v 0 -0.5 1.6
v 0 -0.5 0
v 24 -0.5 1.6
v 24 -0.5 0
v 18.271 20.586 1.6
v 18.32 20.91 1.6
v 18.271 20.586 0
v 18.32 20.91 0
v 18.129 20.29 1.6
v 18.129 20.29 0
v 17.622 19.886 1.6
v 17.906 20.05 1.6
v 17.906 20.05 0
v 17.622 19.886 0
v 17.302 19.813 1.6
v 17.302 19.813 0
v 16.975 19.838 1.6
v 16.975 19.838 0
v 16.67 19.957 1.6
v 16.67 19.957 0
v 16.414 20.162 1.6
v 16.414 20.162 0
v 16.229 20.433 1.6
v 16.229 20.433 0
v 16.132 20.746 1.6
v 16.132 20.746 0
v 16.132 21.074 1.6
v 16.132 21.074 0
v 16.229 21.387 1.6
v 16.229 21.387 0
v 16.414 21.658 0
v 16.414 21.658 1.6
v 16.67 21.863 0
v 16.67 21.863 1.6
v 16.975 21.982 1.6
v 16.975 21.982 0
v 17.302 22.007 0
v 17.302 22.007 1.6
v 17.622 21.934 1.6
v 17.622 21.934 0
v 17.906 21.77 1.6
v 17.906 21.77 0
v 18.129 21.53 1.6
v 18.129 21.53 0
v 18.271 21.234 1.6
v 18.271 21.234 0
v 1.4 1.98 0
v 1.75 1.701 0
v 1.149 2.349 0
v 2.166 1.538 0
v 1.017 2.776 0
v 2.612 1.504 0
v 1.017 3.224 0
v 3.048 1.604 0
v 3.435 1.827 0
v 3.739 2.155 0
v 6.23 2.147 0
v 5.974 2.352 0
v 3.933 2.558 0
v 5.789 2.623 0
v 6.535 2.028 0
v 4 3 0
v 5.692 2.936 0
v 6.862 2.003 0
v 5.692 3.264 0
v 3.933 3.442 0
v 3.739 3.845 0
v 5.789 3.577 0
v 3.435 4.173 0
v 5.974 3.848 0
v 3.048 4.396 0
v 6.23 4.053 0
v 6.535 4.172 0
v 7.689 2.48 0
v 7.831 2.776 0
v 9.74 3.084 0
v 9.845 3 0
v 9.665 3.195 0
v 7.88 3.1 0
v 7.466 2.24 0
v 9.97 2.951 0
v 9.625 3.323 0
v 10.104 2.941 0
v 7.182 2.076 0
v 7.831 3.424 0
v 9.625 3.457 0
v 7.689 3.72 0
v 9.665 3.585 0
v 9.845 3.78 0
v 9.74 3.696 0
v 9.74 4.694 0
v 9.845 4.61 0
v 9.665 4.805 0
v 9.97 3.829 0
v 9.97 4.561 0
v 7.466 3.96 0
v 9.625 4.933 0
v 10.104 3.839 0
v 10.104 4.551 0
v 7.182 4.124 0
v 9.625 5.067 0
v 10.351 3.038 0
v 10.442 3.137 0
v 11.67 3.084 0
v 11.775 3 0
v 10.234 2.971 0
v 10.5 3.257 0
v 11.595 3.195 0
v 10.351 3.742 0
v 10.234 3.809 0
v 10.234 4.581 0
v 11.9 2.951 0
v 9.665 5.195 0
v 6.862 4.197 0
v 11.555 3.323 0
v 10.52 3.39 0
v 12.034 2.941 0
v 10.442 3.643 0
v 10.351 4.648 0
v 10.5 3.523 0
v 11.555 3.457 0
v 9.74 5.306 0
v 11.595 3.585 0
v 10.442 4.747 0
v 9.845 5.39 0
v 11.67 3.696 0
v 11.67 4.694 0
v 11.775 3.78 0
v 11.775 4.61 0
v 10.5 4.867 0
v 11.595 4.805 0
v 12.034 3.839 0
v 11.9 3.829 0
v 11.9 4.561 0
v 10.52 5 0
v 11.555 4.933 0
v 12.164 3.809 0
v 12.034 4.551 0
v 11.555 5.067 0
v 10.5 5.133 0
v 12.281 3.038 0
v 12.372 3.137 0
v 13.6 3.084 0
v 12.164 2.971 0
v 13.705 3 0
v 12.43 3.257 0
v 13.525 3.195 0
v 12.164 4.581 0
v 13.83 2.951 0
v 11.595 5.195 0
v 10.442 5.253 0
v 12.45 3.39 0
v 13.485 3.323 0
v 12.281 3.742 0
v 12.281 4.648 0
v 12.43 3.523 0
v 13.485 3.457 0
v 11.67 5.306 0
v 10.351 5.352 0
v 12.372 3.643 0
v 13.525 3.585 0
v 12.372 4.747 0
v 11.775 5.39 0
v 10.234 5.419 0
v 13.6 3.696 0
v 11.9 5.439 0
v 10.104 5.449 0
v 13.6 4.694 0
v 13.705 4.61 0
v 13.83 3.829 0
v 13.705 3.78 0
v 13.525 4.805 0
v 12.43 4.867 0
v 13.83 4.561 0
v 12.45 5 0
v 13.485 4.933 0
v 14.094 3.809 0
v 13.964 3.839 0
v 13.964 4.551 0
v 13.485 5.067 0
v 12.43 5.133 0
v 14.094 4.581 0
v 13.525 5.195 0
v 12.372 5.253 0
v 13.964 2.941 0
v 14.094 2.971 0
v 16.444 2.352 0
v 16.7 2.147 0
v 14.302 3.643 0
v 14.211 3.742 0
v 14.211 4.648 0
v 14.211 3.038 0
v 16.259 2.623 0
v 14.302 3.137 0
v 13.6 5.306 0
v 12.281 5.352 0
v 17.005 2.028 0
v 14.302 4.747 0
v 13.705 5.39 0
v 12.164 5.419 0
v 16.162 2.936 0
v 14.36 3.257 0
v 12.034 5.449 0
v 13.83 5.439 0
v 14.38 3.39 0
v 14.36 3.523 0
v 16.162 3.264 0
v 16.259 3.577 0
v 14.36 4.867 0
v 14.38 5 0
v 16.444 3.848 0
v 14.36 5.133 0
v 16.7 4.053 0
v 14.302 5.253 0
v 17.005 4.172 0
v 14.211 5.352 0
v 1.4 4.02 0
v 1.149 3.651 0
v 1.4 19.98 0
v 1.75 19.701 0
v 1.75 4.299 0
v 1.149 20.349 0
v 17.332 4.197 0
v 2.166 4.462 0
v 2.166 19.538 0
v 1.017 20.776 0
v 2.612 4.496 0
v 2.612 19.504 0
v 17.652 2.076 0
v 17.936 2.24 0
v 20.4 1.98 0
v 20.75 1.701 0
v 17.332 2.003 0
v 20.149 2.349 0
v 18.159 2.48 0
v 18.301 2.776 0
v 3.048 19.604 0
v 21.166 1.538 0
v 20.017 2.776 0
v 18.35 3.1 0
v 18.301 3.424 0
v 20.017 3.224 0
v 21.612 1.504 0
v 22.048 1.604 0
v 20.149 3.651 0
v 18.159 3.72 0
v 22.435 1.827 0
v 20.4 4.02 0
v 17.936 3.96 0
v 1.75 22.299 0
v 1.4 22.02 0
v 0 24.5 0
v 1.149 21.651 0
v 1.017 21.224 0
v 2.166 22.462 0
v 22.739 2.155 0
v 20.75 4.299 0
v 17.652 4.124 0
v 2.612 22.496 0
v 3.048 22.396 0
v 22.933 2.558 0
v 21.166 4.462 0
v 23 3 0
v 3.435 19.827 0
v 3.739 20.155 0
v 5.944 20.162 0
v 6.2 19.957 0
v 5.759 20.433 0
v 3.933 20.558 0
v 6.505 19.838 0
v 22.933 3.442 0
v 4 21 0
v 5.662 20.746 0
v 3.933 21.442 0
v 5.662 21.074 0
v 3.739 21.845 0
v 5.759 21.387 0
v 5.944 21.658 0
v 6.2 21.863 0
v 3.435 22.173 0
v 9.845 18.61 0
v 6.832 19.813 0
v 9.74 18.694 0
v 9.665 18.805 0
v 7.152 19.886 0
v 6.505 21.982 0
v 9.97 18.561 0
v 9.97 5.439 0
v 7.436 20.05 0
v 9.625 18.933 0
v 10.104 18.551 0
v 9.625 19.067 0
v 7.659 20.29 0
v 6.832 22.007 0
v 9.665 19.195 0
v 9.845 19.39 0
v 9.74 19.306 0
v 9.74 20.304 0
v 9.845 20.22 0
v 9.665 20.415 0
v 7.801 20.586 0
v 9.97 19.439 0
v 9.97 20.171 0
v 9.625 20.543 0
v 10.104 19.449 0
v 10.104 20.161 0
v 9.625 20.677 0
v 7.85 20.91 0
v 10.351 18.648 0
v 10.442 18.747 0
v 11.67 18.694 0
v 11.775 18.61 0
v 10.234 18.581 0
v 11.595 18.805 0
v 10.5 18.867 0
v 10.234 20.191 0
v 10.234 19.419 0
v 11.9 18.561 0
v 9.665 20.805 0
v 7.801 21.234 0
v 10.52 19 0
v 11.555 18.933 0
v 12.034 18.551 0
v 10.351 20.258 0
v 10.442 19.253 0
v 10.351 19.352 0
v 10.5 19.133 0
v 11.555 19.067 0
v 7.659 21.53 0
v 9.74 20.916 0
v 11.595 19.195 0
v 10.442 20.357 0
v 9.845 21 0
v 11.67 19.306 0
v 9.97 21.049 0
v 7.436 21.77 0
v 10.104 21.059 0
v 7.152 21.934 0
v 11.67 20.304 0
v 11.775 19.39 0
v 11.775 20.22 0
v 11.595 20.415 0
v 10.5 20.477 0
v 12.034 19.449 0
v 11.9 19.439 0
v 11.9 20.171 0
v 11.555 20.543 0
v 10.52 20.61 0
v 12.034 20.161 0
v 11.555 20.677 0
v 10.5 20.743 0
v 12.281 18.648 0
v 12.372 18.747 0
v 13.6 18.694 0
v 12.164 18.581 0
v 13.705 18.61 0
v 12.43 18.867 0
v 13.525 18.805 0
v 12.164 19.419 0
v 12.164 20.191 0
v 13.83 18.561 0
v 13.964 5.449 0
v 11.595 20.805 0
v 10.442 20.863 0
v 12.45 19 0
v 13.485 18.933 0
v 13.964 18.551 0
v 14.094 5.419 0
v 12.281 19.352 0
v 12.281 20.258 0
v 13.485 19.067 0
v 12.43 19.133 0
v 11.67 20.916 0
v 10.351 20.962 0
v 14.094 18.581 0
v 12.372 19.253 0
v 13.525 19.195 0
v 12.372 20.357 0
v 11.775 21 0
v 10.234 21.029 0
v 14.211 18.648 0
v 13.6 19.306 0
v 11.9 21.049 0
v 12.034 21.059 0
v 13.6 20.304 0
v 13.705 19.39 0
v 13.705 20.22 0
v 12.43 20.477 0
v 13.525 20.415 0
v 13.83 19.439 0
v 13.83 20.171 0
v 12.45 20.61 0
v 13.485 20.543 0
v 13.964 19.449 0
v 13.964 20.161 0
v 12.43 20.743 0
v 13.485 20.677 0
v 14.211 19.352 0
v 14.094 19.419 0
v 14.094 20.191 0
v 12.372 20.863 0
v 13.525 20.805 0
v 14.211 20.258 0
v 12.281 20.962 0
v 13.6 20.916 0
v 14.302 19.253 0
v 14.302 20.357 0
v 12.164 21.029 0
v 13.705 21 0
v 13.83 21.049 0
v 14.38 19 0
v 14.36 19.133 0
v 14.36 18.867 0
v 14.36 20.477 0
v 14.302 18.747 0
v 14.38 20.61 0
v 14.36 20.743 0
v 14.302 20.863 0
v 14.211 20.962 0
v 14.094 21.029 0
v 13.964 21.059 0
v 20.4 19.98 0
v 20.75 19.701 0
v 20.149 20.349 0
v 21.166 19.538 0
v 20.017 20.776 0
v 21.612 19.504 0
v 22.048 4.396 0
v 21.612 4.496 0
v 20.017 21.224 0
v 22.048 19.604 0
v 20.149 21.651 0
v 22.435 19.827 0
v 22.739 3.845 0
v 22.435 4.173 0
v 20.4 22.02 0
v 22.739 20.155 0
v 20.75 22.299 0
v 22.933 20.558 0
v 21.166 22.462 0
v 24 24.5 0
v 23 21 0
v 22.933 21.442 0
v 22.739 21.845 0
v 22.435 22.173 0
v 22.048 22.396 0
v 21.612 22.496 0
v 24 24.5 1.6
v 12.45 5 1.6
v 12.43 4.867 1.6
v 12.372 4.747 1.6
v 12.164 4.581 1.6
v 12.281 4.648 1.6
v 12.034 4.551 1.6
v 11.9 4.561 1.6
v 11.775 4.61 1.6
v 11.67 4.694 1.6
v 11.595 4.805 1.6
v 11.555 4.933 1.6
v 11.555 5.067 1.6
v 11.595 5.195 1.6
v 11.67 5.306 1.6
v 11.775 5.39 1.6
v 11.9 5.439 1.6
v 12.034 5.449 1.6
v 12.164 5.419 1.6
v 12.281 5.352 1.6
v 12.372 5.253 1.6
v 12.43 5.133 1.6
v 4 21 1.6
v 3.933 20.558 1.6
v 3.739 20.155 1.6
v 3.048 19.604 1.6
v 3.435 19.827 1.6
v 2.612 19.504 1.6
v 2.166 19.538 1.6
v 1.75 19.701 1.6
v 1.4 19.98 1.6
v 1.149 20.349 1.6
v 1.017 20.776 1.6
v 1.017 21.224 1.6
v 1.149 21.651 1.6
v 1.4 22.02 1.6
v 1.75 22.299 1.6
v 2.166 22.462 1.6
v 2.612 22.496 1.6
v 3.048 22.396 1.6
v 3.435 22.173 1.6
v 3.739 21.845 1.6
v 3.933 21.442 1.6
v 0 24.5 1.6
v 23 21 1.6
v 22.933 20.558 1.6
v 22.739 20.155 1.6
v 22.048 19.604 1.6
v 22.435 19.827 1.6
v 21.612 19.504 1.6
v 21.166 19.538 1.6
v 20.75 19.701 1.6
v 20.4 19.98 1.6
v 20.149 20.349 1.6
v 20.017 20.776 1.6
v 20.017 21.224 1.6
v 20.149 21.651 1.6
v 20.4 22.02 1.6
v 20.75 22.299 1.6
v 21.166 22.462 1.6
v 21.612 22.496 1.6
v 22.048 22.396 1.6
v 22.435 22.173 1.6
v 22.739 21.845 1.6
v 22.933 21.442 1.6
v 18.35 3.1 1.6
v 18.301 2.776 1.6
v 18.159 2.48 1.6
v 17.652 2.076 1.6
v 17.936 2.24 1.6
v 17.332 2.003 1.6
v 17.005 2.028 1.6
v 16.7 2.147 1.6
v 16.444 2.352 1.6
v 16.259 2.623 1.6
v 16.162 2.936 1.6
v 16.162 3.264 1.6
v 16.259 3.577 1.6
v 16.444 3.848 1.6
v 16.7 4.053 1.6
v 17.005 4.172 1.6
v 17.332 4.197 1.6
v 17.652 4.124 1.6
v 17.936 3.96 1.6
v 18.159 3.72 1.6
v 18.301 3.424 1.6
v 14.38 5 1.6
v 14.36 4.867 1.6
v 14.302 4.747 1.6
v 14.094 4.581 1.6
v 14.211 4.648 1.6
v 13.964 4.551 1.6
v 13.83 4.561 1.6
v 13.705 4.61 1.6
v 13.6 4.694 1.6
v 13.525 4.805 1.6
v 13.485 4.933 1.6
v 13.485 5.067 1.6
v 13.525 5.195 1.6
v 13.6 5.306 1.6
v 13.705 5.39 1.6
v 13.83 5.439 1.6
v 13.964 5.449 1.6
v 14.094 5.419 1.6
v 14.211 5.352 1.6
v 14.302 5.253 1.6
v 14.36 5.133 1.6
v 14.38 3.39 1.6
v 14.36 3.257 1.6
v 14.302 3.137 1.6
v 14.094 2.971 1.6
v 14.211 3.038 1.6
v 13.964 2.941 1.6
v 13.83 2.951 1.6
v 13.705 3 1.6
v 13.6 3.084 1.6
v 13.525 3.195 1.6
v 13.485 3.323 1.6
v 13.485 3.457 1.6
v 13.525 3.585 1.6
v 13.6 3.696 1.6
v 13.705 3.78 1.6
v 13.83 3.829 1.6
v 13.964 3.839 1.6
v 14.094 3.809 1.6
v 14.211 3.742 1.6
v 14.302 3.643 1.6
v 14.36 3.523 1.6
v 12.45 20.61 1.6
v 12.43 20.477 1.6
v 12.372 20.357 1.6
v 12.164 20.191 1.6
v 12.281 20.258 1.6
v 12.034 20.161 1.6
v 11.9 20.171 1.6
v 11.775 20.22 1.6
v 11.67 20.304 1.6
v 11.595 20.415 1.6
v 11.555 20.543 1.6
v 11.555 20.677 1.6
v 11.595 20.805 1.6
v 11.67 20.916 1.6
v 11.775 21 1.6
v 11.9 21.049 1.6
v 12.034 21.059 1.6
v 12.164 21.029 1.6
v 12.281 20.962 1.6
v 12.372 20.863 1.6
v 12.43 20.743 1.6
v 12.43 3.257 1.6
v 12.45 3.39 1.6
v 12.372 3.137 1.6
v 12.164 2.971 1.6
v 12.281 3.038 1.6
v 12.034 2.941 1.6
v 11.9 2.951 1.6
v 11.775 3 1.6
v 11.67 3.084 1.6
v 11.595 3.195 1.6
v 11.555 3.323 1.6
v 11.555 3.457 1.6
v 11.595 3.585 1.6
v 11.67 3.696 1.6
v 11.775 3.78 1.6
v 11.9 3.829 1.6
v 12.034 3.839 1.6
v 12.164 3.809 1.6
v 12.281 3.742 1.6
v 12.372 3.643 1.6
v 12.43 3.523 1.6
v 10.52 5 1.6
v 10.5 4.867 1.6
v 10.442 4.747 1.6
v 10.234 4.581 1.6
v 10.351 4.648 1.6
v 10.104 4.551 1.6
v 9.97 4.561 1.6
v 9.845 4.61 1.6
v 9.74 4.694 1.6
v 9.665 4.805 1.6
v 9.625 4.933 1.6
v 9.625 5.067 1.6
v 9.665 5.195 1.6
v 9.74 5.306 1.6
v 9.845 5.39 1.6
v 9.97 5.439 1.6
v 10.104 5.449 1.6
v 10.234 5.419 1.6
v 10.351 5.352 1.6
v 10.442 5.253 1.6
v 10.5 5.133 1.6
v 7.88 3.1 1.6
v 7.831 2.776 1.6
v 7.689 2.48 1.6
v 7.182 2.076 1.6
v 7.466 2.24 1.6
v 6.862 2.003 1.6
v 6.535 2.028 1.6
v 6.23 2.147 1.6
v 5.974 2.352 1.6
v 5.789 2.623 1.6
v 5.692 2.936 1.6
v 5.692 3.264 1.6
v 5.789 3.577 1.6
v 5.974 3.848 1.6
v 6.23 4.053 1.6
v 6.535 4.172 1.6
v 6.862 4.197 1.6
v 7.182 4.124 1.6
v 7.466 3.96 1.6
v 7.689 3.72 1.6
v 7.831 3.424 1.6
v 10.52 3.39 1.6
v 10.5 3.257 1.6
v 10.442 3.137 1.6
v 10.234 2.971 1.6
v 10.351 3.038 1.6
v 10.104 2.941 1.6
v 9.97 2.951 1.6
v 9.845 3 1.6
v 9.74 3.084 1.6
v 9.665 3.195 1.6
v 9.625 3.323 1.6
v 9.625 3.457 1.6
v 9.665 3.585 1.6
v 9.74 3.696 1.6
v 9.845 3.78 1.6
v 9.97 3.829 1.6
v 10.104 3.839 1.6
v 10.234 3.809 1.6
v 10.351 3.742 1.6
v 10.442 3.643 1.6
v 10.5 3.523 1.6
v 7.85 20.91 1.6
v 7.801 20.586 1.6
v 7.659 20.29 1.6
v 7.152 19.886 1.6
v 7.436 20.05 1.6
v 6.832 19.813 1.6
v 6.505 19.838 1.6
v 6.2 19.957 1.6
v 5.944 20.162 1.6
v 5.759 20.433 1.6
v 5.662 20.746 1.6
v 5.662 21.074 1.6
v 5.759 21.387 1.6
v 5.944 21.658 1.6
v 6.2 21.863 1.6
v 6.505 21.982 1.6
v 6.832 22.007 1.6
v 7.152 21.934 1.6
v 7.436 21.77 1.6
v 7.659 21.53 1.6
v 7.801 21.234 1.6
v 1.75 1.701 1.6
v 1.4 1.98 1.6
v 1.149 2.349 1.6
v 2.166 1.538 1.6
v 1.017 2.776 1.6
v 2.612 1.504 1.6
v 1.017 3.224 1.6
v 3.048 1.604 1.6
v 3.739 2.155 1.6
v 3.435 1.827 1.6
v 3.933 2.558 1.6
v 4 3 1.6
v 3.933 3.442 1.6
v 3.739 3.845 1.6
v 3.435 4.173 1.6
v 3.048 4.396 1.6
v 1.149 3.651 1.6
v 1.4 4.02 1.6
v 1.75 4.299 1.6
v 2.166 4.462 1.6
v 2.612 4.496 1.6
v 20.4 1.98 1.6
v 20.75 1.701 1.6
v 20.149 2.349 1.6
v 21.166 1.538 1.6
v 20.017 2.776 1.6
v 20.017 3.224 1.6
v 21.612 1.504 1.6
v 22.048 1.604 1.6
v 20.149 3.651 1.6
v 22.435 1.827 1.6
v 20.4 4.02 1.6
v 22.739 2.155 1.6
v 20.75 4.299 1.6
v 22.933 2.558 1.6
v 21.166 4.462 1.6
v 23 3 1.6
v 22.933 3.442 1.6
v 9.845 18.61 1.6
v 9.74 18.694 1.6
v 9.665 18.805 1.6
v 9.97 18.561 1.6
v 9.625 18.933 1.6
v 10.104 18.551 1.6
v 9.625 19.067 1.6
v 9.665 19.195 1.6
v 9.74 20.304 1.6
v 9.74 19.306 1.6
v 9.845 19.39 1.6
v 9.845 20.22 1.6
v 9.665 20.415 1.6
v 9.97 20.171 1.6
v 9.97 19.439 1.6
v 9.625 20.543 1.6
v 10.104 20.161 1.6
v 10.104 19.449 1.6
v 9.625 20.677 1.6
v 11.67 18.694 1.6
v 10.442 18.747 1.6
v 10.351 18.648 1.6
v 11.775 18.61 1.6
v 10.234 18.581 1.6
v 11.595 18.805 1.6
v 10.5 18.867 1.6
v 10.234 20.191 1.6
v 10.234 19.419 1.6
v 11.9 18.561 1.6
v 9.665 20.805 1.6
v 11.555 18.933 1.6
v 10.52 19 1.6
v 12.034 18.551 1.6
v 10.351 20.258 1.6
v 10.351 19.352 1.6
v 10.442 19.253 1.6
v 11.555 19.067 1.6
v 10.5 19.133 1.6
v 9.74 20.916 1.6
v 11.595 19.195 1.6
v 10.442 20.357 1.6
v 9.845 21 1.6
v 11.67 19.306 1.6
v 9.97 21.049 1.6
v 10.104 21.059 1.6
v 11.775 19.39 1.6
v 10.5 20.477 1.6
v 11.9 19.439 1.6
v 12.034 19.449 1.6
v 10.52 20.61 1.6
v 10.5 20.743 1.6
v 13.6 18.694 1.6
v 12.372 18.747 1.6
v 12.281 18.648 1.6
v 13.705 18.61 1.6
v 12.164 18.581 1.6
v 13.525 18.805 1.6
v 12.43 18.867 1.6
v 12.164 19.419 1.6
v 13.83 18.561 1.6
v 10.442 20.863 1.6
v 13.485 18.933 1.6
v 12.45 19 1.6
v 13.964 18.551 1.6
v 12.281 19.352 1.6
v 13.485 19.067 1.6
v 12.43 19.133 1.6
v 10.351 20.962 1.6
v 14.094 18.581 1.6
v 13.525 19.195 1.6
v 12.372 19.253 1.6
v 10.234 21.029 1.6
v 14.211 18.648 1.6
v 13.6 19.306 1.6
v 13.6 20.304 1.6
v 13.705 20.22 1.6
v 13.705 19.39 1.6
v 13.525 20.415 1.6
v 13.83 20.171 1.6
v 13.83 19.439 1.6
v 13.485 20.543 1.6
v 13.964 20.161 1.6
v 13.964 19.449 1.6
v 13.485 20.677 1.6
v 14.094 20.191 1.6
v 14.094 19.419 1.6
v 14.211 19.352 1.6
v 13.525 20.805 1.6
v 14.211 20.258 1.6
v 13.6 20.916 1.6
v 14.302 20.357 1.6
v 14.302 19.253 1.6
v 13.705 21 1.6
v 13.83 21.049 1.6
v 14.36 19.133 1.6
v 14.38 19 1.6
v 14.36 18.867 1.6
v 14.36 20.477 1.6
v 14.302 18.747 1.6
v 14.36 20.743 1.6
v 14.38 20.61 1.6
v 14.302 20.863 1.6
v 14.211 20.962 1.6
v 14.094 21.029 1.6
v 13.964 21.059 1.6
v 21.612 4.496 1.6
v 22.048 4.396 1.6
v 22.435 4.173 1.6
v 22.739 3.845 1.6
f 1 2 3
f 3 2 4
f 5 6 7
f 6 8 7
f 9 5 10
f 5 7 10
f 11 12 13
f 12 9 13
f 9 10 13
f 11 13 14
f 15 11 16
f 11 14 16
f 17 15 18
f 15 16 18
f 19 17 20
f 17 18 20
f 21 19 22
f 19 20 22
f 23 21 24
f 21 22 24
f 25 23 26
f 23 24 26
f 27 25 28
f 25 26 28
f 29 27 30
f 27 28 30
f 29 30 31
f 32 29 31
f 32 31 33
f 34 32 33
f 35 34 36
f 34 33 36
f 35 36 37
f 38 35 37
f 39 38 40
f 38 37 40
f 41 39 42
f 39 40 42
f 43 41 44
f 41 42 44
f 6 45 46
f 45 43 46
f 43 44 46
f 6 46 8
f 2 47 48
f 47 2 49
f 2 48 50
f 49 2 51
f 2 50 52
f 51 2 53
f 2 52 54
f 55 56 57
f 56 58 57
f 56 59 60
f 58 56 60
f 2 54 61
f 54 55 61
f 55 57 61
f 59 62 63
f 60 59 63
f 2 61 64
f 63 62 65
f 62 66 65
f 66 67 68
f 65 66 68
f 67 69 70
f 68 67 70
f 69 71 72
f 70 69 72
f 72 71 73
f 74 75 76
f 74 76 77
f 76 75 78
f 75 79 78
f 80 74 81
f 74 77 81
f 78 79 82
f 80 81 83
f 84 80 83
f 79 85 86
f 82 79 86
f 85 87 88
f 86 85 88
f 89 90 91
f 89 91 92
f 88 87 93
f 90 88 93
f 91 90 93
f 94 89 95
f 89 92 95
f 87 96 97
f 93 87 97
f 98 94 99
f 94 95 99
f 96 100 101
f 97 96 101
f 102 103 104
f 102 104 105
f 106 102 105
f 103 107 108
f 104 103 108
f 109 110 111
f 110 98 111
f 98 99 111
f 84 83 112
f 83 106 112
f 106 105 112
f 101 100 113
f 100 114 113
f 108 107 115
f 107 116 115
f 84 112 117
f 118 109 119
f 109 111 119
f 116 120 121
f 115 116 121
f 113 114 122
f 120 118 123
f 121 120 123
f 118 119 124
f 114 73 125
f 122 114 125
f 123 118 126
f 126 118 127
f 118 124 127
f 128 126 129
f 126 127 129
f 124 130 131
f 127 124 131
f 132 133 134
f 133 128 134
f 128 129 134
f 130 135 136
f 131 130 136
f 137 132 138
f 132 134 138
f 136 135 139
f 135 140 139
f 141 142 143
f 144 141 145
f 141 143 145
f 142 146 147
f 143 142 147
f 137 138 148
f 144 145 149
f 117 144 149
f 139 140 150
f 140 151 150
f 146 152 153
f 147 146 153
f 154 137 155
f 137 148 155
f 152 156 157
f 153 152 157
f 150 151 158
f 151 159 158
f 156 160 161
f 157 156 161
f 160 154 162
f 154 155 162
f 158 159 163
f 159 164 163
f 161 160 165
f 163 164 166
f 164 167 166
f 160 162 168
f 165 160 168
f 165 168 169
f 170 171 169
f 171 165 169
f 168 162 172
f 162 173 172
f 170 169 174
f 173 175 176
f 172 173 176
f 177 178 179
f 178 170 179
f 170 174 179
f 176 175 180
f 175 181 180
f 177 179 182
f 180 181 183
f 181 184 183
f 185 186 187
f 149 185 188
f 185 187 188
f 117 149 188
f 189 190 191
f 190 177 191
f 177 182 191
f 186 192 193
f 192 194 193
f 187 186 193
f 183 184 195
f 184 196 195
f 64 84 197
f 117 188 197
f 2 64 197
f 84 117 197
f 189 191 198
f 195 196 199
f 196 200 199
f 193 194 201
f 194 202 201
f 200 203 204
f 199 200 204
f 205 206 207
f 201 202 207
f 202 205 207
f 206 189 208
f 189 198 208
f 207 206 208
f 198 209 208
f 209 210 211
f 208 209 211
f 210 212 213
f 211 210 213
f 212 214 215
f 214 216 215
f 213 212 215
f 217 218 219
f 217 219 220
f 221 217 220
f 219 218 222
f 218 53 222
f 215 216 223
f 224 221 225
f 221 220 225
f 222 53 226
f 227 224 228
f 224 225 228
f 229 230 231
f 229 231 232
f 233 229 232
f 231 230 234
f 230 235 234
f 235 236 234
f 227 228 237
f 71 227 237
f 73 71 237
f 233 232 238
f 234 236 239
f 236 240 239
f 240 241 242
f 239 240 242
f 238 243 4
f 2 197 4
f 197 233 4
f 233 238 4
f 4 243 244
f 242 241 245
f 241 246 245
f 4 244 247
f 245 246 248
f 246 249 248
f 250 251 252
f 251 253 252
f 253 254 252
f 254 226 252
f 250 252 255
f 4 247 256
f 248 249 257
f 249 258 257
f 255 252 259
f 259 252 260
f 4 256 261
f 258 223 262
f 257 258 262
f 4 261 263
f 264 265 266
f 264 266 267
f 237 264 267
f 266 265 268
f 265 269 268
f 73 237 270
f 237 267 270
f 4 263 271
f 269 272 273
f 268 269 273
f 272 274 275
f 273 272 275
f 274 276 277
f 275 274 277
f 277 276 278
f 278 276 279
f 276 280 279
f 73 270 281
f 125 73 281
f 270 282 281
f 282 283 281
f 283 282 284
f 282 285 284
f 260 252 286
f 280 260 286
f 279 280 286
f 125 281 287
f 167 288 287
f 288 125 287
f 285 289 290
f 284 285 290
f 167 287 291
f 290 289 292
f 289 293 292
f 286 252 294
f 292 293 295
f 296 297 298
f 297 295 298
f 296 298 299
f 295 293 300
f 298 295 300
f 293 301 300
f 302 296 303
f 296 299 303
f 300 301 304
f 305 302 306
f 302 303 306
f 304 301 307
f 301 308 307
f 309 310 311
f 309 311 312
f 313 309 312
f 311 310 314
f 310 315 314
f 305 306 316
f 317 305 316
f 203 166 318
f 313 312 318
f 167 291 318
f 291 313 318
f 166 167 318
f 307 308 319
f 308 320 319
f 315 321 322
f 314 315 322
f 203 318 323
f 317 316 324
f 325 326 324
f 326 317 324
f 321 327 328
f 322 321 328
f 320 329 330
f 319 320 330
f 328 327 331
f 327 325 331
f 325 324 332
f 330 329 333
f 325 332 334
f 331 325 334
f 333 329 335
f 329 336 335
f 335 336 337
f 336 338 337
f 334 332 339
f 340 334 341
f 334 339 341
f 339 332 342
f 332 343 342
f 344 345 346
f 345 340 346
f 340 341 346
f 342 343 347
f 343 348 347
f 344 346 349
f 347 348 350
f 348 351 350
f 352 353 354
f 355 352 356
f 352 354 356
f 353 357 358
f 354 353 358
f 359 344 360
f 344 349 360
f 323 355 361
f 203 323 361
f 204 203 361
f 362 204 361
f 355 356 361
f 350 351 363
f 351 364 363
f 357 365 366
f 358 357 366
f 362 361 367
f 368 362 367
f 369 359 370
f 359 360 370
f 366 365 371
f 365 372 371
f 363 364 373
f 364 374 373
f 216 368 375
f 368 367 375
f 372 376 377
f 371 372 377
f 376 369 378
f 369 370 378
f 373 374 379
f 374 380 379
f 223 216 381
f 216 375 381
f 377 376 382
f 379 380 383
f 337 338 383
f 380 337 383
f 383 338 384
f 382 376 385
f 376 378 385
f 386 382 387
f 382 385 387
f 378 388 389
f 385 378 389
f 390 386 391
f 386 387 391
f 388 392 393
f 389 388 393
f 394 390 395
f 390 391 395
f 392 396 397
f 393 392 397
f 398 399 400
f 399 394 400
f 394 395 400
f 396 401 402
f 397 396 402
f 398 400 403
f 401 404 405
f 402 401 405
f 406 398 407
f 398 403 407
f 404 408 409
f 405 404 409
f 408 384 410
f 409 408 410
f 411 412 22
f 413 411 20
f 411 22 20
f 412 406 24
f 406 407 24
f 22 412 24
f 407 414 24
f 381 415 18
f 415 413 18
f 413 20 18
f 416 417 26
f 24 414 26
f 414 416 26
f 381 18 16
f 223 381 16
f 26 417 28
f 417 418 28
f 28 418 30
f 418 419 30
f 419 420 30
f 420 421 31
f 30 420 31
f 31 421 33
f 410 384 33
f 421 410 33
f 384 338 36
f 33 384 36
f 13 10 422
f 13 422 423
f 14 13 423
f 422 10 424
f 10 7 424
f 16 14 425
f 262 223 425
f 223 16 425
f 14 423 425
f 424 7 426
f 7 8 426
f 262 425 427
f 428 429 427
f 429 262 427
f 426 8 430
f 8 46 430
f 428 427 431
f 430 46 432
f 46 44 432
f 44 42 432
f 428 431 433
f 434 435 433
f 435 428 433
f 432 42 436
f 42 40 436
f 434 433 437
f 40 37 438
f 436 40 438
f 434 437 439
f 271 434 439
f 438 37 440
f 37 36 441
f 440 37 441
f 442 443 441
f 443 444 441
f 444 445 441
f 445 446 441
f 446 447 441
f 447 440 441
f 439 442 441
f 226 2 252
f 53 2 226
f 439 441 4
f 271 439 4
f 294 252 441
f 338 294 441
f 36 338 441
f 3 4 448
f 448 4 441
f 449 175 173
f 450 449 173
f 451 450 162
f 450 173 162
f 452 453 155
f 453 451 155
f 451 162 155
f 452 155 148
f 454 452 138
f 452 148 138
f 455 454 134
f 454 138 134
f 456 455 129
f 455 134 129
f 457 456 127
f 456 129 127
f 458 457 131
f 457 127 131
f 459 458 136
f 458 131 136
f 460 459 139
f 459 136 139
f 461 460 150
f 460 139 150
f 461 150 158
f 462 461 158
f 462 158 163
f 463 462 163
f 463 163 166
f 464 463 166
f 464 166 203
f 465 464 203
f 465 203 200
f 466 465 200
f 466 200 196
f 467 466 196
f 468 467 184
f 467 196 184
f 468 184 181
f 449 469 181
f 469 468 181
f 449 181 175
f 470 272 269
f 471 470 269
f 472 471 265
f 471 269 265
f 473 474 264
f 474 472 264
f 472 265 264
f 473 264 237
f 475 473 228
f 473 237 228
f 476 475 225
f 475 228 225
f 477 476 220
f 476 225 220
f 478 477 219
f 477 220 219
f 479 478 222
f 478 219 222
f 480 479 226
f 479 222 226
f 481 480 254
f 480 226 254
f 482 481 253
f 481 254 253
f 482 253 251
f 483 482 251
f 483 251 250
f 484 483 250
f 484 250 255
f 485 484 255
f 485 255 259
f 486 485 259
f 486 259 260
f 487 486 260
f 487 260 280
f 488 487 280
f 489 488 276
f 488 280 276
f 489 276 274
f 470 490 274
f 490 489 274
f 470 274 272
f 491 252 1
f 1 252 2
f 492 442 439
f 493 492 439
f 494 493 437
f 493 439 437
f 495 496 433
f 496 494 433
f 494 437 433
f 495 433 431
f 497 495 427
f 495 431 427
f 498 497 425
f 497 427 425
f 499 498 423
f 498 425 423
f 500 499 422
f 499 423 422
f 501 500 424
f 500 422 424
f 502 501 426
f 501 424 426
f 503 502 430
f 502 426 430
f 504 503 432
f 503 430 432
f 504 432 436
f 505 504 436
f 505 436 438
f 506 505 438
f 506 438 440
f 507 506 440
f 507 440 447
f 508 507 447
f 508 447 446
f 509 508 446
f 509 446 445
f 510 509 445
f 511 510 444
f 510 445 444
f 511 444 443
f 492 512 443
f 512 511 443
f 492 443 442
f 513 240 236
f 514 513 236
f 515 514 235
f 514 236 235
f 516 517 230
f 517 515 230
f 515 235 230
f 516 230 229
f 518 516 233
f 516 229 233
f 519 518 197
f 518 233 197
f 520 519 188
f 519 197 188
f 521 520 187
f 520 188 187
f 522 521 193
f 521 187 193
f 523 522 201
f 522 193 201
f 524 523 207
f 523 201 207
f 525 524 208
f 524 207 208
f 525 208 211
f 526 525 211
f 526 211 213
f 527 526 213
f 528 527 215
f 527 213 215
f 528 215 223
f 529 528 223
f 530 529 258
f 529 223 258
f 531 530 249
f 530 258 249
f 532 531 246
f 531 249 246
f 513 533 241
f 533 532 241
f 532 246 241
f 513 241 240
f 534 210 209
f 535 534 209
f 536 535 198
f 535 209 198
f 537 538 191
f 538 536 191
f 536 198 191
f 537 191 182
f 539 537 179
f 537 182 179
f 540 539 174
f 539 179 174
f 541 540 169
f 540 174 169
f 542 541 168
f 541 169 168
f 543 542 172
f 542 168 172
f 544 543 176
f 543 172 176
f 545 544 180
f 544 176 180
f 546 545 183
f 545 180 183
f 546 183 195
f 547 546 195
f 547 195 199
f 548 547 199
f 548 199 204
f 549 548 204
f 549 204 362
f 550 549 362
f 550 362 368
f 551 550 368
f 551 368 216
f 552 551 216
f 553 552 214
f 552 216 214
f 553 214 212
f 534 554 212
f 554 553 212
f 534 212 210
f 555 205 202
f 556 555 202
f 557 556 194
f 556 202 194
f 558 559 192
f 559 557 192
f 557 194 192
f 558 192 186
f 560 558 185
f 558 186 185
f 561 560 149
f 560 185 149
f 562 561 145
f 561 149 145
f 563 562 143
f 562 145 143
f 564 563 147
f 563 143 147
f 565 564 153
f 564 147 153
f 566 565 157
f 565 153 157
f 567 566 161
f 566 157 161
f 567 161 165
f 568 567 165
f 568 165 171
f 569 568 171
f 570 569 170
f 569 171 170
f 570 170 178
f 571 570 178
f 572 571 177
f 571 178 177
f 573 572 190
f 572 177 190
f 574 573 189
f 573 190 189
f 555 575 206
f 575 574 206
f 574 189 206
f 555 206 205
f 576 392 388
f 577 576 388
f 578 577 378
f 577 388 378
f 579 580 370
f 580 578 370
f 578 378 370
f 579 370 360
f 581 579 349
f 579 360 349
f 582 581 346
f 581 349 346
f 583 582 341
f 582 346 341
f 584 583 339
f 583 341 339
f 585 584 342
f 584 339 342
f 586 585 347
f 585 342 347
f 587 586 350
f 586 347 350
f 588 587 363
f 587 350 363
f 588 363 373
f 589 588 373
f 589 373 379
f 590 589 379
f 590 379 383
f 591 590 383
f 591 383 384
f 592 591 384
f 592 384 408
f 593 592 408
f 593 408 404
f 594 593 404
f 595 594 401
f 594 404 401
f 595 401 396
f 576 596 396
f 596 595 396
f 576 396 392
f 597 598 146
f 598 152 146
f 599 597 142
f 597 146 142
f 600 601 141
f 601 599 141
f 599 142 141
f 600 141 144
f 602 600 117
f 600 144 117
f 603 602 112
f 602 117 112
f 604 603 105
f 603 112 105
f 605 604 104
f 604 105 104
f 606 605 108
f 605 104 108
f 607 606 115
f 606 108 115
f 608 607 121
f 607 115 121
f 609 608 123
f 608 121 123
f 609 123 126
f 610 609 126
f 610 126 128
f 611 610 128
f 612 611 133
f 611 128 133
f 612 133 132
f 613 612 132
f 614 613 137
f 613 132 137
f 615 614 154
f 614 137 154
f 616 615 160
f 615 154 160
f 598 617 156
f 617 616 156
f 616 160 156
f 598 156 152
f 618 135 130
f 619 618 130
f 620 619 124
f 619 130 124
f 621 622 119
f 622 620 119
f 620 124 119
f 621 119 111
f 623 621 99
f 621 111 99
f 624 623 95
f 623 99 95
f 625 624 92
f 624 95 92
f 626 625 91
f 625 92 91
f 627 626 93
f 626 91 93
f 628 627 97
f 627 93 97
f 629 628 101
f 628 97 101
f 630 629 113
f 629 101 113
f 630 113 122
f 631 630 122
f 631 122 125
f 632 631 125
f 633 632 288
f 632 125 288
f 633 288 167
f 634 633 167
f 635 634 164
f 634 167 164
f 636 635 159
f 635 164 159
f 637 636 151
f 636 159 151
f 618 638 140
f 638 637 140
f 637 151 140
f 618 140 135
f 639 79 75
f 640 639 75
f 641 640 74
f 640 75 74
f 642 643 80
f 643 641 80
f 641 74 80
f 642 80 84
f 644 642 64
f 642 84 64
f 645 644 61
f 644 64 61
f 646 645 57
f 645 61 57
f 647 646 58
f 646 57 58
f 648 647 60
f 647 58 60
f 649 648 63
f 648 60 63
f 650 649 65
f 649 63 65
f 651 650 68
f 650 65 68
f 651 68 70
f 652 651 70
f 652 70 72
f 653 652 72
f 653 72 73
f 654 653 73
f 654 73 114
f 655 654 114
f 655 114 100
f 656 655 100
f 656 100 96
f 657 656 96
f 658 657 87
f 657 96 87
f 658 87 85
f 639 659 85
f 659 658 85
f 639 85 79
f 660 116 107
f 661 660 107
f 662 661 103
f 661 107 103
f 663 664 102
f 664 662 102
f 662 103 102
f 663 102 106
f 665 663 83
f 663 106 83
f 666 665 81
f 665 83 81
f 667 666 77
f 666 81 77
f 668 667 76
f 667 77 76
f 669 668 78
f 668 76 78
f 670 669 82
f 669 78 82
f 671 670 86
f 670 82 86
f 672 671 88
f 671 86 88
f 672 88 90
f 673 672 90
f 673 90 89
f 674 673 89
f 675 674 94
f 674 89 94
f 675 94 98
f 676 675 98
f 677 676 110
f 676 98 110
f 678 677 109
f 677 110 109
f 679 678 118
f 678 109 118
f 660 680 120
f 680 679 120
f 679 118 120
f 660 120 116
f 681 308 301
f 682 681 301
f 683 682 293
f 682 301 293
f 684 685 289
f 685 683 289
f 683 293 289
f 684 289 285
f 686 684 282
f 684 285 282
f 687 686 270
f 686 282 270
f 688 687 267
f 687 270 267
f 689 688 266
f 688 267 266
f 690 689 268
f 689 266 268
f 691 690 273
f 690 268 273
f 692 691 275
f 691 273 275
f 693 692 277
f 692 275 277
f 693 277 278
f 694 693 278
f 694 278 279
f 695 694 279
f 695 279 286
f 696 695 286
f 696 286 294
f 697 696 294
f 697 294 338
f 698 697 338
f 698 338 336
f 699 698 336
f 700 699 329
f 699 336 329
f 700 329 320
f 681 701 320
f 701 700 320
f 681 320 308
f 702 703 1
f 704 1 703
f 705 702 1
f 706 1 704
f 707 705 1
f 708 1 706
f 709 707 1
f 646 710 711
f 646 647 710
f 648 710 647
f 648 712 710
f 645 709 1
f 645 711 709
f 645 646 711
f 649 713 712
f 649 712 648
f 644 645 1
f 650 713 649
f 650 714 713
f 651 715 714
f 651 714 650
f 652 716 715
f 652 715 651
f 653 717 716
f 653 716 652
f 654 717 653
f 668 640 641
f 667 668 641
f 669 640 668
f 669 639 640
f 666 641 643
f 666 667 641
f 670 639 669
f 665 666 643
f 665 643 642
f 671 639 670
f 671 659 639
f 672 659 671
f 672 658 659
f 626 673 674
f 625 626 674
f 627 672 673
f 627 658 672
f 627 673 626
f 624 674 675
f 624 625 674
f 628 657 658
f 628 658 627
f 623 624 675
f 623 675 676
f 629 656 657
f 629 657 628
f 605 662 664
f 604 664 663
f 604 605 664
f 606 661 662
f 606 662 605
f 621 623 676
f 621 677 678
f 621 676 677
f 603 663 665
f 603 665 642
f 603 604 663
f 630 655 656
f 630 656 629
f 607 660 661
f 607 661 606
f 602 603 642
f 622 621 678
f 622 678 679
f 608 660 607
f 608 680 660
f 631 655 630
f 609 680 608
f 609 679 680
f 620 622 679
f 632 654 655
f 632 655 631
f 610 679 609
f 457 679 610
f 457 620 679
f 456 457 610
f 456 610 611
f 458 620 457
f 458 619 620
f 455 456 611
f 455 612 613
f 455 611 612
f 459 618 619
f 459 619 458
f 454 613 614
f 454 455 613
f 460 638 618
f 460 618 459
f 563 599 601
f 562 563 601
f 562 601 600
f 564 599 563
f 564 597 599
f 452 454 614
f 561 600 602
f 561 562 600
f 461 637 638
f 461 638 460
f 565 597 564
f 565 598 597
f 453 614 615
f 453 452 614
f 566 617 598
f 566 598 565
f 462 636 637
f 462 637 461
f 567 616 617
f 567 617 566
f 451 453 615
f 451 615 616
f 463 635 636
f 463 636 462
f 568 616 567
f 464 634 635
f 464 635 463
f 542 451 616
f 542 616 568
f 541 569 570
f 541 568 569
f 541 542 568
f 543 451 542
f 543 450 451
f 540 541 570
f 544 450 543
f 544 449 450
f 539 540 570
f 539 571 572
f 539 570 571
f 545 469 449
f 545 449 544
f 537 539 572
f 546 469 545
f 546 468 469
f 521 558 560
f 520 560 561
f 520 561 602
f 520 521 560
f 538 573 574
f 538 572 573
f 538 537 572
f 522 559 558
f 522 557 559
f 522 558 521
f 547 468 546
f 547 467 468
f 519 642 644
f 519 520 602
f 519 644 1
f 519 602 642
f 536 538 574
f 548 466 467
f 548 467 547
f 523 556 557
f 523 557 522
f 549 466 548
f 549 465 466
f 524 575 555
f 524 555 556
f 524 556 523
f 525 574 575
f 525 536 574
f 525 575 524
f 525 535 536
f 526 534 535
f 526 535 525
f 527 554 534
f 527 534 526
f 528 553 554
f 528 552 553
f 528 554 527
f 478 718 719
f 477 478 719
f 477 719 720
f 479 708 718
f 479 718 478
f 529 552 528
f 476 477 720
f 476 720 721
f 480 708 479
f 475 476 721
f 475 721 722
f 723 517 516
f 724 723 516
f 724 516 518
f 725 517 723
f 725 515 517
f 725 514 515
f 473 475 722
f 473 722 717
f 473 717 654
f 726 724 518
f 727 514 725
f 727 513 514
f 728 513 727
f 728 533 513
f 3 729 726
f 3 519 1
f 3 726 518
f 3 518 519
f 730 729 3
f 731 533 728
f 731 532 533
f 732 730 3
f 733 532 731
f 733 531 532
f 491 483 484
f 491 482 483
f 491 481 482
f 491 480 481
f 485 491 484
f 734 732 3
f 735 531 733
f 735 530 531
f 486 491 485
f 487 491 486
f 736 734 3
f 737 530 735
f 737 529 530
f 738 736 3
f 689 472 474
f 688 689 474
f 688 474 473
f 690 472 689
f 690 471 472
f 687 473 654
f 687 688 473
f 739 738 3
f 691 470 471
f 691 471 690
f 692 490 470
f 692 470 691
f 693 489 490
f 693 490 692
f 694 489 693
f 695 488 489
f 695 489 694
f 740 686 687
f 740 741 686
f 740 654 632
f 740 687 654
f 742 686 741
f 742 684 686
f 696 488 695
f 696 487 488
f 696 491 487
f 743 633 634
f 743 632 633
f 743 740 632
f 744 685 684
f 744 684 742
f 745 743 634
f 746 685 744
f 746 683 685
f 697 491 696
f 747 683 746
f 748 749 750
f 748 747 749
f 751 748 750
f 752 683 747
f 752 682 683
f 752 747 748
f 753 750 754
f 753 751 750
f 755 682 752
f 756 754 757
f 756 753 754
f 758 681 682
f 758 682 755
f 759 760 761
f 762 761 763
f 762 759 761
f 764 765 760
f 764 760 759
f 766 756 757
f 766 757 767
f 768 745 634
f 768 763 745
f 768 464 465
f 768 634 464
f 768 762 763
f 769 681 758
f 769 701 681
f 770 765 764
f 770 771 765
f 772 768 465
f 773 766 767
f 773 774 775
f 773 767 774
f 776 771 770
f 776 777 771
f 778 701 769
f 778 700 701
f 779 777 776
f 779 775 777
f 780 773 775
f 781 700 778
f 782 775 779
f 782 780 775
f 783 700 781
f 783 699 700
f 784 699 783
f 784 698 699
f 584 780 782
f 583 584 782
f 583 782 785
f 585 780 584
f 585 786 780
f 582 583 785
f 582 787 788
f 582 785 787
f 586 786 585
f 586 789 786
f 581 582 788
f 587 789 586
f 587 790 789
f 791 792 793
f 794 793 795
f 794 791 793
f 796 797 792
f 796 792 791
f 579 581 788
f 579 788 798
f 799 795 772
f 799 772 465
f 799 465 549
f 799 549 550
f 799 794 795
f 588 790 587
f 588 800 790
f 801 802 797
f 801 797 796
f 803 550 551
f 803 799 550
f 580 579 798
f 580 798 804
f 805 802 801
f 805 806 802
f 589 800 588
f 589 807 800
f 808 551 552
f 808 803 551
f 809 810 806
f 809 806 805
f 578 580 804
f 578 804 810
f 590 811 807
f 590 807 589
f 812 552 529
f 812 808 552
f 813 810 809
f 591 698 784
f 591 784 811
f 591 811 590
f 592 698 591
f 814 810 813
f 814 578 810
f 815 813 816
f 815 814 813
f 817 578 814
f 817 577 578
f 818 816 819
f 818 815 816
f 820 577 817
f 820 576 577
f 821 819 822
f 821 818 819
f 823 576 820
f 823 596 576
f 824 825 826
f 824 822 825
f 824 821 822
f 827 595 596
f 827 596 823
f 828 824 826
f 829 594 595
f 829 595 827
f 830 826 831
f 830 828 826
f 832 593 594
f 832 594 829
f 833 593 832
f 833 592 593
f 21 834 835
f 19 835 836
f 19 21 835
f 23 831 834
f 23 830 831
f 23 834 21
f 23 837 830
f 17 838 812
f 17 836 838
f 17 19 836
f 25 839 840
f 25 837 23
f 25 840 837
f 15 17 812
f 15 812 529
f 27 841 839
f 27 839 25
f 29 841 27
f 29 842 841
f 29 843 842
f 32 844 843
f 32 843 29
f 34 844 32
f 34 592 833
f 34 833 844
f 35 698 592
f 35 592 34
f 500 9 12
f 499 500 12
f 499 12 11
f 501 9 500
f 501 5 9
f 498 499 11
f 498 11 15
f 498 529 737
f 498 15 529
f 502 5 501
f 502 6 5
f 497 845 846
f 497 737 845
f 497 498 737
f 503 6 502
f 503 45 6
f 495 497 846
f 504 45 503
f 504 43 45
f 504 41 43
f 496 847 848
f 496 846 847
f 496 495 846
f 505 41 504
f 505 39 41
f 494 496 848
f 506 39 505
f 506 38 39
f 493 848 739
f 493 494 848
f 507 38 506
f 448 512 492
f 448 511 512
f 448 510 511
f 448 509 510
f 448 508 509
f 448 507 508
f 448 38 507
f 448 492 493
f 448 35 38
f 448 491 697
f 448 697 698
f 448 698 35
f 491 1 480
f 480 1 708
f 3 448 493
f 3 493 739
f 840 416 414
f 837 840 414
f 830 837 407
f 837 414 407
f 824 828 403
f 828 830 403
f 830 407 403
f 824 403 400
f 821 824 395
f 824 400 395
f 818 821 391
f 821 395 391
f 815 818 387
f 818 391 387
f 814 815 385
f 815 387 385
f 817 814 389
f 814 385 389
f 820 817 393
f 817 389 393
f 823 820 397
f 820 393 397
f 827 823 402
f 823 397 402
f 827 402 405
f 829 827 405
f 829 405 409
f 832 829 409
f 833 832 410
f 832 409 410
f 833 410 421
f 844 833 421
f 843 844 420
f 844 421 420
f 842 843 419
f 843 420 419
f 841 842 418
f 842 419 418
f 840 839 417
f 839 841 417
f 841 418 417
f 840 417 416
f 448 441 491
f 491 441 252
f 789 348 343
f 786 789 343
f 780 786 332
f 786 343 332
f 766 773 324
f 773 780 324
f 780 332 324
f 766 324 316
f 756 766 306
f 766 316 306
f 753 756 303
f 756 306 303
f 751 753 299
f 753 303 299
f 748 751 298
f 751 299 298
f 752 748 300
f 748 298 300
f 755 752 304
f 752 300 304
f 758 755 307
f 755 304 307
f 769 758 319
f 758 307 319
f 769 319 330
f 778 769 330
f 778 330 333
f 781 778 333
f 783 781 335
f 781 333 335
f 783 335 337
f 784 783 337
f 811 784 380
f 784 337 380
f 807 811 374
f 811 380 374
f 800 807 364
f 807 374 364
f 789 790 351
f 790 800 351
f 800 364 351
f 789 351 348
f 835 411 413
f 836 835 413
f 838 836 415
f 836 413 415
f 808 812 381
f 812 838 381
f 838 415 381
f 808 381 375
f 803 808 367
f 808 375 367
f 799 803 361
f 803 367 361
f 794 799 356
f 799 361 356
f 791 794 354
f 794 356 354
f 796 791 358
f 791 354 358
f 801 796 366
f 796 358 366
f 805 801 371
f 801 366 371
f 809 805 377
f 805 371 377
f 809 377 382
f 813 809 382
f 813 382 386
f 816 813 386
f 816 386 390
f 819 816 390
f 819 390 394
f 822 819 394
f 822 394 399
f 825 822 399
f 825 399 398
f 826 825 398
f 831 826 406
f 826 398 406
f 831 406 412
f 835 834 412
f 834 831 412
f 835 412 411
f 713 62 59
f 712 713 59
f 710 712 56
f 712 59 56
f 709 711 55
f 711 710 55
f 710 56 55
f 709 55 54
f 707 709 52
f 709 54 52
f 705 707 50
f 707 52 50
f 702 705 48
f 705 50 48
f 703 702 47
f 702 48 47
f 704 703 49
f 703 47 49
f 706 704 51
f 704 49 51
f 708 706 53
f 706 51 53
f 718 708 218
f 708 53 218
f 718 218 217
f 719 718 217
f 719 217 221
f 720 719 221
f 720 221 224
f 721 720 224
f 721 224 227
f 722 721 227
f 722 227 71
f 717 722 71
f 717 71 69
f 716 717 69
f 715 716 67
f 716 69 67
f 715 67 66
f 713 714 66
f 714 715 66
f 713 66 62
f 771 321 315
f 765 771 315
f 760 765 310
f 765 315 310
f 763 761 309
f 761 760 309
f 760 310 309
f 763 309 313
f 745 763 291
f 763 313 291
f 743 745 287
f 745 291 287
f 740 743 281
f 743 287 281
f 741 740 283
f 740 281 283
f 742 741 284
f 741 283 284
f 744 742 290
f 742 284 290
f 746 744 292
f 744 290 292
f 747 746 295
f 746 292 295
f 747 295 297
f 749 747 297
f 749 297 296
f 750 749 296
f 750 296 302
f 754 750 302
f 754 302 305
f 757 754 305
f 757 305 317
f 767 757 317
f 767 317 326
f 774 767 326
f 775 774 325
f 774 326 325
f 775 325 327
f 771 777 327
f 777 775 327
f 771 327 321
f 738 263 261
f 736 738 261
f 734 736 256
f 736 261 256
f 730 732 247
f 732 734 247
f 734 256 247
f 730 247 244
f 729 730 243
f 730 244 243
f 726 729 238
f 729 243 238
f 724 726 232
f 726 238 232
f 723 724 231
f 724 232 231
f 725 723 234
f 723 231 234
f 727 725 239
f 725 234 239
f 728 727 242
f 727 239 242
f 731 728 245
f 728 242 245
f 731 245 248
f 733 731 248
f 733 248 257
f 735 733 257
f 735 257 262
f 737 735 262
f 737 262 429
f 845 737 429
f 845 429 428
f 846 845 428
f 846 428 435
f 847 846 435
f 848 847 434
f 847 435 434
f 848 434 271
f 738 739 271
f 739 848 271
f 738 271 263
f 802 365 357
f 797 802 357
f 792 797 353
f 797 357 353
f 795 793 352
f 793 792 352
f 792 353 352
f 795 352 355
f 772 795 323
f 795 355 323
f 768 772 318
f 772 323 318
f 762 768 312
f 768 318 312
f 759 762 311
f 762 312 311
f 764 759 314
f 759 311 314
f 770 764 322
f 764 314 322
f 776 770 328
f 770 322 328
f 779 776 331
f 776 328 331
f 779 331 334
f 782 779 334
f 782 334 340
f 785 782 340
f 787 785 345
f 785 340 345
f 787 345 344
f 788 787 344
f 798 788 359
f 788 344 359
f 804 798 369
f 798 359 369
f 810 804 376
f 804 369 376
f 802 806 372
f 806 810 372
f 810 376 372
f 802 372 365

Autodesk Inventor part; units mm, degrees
ref_plane "YZ Plane" through (0, 0, 0) normal (1, 0, 0) x (0, 1, 0)
ref_plane "XZ Plane" through (0, 0, 0) normal (0, 1, 0) x (-1, 0, 0)
ref_plane "XY Plane" through (0, 0, 0) normal (0, 0, 1) x (1, 0, 0)
sketch "Sketch1" plane through (0, 0, 0) normal (0, 0, 1) x (1, 0, 0)
  line L0 (0, -0.5) -> (24, -0.5)
  line L1 (24, -0.5) -> (24, 24.5)
  line L2 (24, 24.5) -> (0, 24.5)
  line L3 (0, 24.5) -> (0, -0.5)
  circle A0 centre (13.93, 20.61) radius 0.45
  circle A1 centre (17.22, 20.91) radius 1.1
  circle A2 centre (6.75, 20.91) radius 1.1
  circle A3 centre (13.93, 19) radius 0.45
  circle A4 centre (12, 20.61) radius 0.45
  circle A5 centre (12, 19) radius 0.45
  circle A6 centre (10.07, 20.61) radius 0.45
  circle A7 centre (10.07, 19) radius 0.45
  circle A8 centre (10.07, 3.39) radius 0.45
  circle A9 centre (6.78, 3.1) radius 1.1
  circle A10 centre (17.25, 3.1) radius 1.1
  circle A11 centre (10.07, 5) radius 0.45
  circle A12 centre (12, 3.39) radius 0.45
  circle A13 centre (12, 5) radius 0.45
  circle A14 centre (13.93, 3.39) radius 0.45
  circle A15 centre (13.93, 5) radius 0.45
  circle A16 centre (2.5, 21) radius 1.5
  circle A17 centre (21.5, 21) radius 1.5
  circle A18 centre (21.5, 3) radius 1.5
  circle A19 centre (2.5, 3) radius 1.5
extrude "untitled.brd_Outline" add sketch "Sketch1" along normal blind 1.6
properties part number "untitled.brd_Outline"
